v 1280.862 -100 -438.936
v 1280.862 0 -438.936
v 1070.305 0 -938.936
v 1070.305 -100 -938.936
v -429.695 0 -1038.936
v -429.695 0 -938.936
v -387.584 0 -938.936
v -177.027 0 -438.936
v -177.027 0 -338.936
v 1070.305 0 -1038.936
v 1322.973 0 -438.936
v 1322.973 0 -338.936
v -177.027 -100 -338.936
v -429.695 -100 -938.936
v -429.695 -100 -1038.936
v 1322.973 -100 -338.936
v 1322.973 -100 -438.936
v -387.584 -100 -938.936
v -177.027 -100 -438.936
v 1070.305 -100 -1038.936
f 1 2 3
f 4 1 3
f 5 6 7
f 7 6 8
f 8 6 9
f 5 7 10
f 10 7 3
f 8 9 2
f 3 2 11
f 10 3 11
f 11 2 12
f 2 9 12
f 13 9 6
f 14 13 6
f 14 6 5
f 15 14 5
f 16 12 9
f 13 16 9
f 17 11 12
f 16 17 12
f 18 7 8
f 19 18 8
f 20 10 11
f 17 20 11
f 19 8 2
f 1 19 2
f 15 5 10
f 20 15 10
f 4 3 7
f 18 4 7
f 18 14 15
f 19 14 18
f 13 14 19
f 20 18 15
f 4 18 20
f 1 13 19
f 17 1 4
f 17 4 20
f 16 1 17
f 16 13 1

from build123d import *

# Parameters (mm, degrees)
F1_DEPTH = 100
F2_DEPTH = 100
F3_DEPTH = 100


with BuildPart() as f1:
    # F0 (on Front) → F1 (new body)
    with BuildSketch(Plane.XZ):
        Polygon((-177.0265877346, -438.935896764), (1280.8620243115, -438.935896764), (1322.9734122654, -338.935896764), (-177.0265877346, -338.935896764), align=None)
    extrude(amount=F1_DEPTH)

    # F0 (on Front) → F2 (join)
    with BuildSketch(Plane.XZ):
        Polygon((-177.0265877346, -338.935896764), (-345.4721395502, -738.935896764), (-303.3607515963, -738.935896764), (-177.0265877346, -438.935896764), align=None)
        Polygon((-345.4721395502, -738.935896764), (-429.694915458, -938.935896764), (-387.5835275041, -938.935896764), (-303.3607515963, -738.935896764), align=None)
        Polygon((-429.694915458, -938.935896764), (-429.694915458, -1038.935896764), (-387.5835275041, -938.935896764), align=None)
    extrude(amount=F2_DEPTH)

    # F0 (on Front) → F3 (join)
    with BuildSketch(Plane.XZ):
        Polygon((1280.8620243115, -438.935896764), (1322.9734122654, -438.935896764), (1322.9734122654, -338.935896764), align=None)
        Polygon((1070.305084542, -938.935896764), (1070.305084542, -1038.935896764), (1322.9734122654, -438.935896764), (1280.8620243115, -438.935896764), (1154.5278604498, -738.935896764), align=None)
        Polygon((-387.5835275041, -938.935896764), (-429.694915458, -1038.935896764), (1070.305084542, -1038.935896764), (1070.305084542, -938.935896764), align=None)
    extrude(amount=F3_DEPTH)


solid = f1.part
